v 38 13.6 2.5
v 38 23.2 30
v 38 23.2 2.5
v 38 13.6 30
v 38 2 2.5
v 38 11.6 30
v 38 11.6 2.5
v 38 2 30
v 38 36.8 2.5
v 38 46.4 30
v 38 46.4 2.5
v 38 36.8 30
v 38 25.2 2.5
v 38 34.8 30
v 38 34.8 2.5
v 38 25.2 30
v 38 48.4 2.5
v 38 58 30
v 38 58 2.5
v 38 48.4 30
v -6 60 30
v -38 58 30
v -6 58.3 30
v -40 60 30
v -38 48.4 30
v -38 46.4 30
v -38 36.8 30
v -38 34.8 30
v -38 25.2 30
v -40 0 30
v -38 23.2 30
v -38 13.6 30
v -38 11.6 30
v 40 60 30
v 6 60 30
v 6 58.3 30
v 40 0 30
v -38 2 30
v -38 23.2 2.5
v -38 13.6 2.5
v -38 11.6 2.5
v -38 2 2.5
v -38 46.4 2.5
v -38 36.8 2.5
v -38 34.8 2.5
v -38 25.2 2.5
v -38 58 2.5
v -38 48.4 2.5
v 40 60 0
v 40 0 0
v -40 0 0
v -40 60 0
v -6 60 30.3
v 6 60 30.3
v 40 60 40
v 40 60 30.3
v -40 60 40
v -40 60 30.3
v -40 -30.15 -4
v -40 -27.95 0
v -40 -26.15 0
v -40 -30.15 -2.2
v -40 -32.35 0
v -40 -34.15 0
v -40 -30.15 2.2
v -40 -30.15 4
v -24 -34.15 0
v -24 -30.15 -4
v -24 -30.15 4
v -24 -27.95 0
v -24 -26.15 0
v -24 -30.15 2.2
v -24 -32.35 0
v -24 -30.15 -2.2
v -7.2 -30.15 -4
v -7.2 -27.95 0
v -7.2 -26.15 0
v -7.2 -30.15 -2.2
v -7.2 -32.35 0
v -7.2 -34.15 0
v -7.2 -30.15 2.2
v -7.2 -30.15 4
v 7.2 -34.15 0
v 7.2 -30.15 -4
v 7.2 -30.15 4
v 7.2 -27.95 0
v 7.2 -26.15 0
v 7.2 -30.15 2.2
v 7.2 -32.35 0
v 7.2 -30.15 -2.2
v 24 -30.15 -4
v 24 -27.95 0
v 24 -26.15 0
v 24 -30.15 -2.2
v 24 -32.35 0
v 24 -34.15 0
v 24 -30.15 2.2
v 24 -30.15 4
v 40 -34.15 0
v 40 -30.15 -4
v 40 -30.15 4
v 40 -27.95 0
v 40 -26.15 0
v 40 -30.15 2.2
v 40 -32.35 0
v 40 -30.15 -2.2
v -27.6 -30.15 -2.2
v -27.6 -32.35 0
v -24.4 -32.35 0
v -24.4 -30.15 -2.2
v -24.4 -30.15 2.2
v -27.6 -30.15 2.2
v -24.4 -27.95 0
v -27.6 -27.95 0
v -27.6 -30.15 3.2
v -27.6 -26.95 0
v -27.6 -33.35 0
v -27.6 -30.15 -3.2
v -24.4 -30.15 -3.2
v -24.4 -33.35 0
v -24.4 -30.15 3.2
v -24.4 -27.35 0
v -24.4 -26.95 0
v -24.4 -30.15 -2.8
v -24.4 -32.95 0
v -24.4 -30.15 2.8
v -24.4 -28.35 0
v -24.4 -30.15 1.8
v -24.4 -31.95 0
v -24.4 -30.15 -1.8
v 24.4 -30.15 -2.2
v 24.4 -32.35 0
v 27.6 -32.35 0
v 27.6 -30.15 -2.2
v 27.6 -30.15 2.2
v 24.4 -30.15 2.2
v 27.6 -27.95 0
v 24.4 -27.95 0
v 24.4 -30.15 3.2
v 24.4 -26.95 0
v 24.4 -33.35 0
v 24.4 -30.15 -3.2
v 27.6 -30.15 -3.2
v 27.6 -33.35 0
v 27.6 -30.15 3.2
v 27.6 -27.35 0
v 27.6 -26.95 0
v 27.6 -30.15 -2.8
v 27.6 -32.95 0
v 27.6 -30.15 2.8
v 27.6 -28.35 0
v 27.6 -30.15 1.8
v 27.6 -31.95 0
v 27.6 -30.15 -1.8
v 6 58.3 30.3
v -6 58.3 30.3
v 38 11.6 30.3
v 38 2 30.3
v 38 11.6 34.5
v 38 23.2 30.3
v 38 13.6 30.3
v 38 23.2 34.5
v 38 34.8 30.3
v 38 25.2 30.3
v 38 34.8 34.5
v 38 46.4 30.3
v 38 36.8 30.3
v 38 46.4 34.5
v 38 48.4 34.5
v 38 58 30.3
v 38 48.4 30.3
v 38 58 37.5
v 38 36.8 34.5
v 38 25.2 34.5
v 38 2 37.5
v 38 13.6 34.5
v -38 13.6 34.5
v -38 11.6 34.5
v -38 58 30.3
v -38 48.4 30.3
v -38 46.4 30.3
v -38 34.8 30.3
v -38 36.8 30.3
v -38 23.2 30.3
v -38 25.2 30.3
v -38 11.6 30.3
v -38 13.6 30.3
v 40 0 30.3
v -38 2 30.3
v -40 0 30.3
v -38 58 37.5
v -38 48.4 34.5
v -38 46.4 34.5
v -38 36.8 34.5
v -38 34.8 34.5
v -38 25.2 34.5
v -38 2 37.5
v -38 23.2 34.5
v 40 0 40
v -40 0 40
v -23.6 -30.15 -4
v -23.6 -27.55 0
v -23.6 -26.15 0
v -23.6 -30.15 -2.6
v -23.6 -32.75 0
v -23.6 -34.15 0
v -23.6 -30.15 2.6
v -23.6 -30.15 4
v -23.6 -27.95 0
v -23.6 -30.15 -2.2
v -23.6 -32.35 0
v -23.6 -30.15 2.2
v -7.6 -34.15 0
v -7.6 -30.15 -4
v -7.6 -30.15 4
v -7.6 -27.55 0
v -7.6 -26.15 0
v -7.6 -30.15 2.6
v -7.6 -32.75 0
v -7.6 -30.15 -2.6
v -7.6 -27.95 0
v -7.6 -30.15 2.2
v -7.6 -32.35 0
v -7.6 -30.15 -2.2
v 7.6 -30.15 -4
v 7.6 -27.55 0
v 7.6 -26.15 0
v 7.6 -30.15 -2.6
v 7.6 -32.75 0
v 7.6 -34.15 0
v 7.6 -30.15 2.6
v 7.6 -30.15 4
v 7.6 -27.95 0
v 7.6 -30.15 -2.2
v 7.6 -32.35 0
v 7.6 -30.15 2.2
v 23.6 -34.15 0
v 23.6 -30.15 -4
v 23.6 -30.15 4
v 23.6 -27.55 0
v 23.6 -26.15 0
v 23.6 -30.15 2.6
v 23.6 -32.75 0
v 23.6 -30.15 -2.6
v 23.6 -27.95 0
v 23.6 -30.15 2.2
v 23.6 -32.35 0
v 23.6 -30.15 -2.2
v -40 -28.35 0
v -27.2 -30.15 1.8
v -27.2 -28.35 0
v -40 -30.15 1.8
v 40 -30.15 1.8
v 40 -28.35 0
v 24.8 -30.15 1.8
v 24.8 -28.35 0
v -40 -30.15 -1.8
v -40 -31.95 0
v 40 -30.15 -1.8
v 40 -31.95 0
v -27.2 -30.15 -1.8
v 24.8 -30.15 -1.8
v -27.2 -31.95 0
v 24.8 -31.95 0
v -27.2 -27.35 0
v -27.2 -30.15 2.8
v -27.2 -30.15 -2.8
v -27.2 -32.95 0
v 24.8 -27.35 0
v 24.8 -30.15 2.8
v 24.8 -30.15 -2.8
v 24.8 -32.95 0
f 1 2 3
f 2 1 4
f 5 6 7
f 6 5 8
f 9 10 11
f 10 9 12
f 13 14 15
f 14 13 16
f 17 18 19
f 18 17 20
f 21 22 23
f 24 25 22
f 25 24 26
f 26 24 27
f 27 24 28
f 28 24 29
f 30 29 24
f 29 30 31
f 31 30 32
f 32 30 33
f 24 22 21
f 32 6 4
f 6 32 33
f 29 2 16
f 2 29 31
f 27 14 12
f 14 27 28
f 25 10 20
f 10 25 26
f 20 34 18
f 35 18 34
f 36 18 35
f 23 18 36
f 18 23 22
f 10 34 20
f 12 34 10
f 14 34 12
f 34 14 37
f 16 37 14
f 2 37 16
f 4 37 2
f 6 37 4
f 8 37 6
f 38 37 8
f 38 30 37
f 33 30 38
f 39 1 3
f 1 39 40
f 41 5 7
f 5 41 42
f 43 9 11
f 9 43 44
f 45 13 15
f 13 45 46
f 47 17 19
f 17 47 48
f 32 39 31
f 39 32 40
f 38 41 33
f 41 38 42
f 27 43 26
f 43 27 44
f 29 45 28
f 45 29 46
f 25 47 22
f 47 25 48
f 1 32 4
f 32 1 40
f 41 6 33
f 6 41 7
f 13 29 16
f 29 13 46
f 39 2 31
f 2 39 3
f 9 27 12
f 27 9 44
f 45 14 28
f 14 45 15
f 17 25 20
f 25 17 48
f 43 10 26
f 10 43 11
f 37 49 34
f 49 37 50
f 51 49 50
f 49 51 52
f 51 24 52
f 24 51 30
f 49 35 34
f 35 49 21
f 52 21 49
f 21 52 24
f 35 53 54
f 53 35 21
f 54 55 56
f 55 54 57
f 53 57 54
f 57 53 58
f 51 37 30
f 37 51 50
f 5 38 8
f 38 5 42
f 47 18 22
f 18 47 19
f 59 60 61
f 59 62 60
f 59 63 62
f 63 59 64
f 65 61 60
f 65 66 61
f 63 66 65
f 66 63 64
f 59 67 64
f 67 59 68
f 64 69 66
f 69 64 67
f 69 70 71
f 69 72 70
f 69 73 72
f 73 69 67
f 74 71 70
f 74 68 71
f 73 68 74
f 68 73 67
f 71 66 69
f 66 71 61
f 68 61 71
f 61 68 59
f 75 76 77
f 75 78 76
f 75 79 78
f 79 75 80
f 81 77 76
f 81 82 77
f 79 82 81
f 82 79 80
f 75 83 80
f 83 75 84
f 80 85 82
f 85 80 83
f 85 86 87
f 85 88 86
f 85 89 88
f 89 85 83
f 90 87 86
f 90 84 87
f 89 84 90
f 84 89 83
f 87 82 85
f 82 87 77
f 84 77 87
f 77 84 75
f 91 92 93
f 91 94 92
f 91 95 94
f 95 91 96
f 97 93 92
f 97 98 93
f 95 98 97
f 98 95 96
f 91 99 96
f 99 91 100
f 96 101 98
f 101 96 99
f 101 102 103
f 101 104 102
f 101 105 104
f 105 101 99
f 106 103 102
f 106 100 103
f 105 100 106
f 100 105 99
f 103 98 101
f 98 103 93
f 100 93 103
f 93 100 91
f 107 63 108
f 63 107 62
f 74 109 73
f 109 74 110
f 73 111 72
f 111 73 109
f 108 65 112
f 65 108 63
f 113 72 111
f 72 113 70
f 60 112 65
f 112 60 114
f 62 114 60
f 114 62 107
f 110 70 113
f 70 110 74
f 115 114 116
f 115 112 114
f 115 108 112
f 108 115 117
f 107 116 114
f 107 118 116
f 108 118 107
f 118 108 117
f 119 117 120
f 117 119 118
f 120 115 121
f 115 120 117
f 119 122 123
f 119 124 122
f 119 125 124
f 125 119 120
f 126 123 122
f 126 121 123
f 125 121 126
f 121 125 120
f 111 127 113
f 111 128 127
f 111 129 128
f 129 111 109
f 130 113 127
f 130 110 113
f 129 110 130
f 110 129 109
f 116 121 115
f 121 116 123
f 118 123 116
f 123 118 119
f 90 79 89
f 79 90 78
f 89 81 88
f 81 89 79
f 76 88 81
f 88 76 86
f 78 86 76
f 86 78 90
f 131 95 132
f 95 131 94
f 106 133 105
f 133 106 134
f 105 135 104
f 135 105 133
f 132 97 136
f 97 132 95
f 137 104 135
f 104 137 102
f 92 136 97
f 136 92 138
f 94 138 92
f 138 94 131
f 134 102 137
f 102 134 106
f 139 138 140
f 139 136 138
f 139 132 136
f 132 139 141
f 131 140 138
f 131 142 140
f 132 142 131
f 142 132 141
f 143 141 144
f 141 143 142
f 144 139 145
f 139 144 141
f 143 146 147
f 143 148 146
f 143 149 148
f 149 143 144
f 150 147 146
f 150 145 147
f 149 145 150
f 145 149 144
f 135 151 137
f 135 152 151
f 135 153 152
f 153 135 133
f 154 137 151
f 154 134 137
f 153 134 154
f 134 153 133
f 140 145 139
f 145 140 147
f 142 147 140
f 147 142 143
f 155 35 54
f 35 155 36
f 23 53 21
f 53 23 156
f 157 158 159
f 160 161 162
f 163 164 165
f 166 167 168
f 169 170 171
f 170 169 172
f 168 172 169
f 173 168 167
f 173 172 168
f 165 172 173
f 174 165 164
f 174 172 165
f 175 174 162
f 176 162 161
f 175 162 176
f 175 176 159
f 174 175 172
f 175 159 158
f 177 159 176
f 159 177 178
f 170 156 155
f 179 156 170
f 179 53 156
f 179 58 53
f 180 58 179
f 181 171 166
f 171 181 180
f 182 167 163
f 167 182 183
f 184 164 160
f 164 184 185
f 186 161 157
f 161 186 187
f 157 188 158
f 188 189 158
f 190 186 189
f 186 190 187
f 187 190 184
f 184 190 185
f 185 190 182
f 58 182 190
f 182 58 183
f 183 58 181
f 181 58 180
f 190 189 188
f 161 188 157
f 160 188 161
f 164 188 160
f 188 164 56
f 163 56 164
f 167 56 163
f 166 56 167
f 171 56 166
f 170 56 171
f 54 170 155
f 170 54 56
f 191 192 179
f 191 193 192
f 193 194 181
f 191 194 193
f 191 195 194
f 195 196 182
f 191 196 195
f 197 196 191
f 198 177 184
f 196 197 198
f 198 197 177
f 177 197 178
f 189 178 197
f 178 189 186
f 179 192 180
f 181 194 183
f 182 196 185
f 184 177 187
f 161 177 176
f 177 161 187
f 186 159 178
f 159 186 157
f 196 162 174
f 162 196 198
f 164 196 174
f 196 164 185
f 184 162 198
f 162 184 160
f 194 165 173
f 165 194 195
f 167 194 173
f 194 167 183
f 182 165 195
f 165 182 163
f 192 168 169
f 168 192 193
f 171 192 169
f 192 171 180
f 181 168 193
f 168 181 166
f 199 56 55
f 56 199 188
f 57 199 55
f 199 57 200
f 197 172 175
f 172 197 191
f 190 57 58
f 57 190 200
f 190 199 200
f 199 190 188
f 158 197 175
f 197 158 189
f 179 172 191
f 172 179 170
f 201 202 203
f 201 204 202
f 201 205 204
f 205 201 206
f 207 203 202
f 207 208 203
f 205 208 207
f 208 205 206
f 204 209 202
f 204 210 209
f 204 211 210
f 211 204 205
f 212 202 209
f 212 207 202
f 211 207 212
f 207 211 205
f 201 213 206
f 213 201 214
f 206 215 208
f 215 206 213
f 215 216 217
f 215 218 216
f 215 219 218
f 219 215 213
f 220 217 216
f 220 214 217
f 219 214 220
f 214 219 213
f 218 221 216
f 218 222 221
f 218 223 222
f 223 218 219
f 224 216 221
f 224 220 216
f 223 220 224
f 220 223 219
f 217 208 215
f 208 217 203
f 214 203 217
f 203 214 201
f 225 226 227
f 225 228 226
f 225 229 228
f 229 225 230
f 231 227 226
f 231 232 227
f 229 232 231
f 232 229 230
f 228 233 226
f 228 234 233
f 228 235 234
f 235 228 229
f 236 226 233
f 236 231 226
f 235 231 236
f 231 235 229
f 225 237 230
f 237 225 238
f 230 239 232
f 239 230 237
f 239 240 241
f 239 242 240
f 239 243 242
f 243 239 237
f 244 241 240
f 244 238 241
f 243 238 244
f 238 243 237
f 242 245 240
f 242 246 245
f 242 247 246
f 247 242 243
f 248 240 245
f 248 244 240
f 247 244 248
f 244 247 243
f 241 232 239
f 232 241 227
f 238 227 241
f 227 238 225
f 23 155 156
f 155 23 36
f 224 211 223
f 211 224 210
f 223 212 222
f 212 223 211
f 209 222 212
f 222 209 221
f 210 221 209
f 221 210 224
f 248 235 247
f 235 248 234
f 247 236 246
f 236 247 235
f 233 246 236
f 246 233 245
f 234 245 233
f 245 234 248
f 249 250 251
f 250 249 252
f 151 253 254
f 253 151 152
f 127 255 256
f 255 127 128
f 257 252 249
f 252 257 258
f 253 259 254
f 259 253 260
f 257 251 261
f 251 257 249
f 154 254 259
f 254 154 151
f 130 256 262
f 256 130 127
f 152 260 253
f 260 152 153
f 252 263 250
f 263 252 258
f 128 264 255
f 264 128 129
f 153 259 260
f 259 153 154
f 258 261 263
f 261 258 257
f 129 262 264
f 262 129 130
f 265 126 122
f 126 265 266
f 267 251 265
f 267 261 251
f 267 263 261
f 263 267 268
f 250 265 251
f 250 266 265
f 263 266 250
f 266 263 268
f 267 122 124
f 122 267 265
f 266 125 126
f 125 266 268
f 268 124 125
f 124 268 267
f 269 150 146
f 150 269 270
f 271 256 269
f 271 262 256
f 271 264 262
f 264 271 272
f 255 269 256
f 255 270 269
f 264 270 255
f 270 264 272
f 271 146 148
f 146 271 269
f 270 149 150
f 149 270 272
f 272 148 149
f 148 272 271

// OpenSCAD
/* Box with print-in-place hinge - step 1: params + base */
part = "assembly"; // [base, lid, pin, assembly]

cadverify_only = "";
module instance(name, part, unit = 1) {
    echo(cadverify_instance = [name, part, unit]);
    if (cadverify_only == "" || cadverify_only == name) children();
}

// ---- parameters (mm) ----
W = 80; D = 60; H = 40;          // body outer, closed
baseH = 30;                      // base height
gapZLid = 0.3;                   // lid-base vertical gap
lidBot = baseH + gapZLid;        // 30.3
lidTop = H;                      // 40
axY = 0; axZ = baseH + gapZLid/2; // hinge axis (0, 30.15)
wallT = 2; floorT = 2.5; lidTopT = 2.5;
pinH = 1.8; boreH = 2.2; outH = 4.0; cbH = 3.2; capH = 2.8;
clrR = 0.4; clrA = 0.4;
divT = 2; divTop = 37.2;

// knuckle X intervals
bx10=-40; bx11=-24; lx10=-23.6; lx11=-7.6;
bx20=-7.2; bx21=7.2; lx20=7.6; lx21=23.6; bx30=24; bx31=40;

// generic prism along X from polygon in (Z,Y) mapped: poly points [z,y]
module prism_x(poly, x0, len) {
    translate([x0, 0, 0]) rotate([0,90,0])
        linear_extrude(height=len) polygon(poly);
}
function diamond(h) = [[-h,0],[0,-h],[h,0],[0,h]];

module knuckle_out(x0, len) {
    // diamond cross-section points [z,y] centered at (axZ, axY)
    p = diamond(outH);
    translate([0, axY, axZ]) prism_x(p, x0, len);
}
module bore_small(x0, len) {
    p = diamond(boreH);
    translate([0, axY, axZ]) prism_x(p, x0, len);
}
module bore_cb(x0, len) {
    p = diamond(cbH);
    translate([0, axY, axZ]) prism_x(p, x0, len);
}

function D(h,y0,z0) = [[y0-h,-z0],[y0,-z0-h],[y0+h,-z0],[y0,-z0+h]];
module dia(h,y0,z0,x0,x1) {
    translate([x0,0,0]) rotate([0,90,0])
        linear_extrude(height=x1-x0, convexity=4) polygon(D(h,y0,z0));
}
module base_geo() {
    difference() {
        union() {
            translate([-40,0,0]) cube([80,60,2.5]);            // floor
            translate([-40,0,0]) cube([80,2,30]);              // back wall
            translate([-40,58,0]) cube([80,2,30]);             // front wall
            translate([-40,2,0]) cube([2,56,30]);              // left wall
            translate([38,2,0]) cube([2,56,30]);               // right wall
            for (cy=[12.6,24.2,35.8,47.4])
                translate([-38,cy-1,2.5]) cube([76,2,27.5]);   // dividers
            dia(outH,0,axZ,bx10,bx11);                         // knuckles
            dia(outH,0,axZ,bx20,bx21);
            dia(outH,0,axZ,bx30,bx31);
        }
        // bore channels + cap pockets
        dia(boreH,0,axZ,bx10,bx11); dia(cbH,0,axZ,-27.6,-24.4);
        dia(boreH,0,axZ,bx20,bx21);
        dia(boreH,0,axZ,bx30,bx31); dia(cbH,0,axZ,24.4,27.6);
        // back-wall notches under lid knuckles
        dia(boreH+clrR,0,axZ,lx10,lx11);
        dia(boreH+clrR,0,axZ,lx20,lx21);
        // catch groove in front wall outer face
        translate([-6,58.8,27.5]) cube([12,1.21,1.5]);
    }
}

module lid_geo() {
    difference() {
        union() {
            // top plate: x -40..40, y 0..60, z 37.5..40
            translate([-40,0,37.5]) cube([80,60,2.5]);
            // lid skirt walls 2mm, y 0..60, z 30.3..37.5
            translate([-40,0,30.3]) cube([80,2,7.2]);    // back band
            translate([-40,58,30.3]) cube([80,2,7.2]);   // front band
            translate([-40,2,30.3]) cube([2,56,7.2]);    // left band
            translate([38,2,30.3]) cube([2,56,7.2]);     // right band
            // lid skirt inner closure panels (also skirt divider walls)
            for (cy=[12.6,24.2,35.8,47.4])
                translate([-38,cy-1,30.3]) cube([76,2,4.2]);  // up to 34.5
            // lid knuckles + catch tongue
            dia(outH,0,axZ,lx10,lx11);
            dia(outH,0,axZ,lx20,lx21);
            translate([-6,58.3,27.5]) cube([12,1.7,3.4]);  // tongue tab below front band
        }
        // bore channels
        dia(boreH,0,axZ,lx10,lx11);
        dia(boreH,0,axZ,lx20,lx21);
        // clearance pockets opposite base knuckles
        dia(boreH+clrR,0,axZ,-27.6,-23.6);
        dia(boreH+clrR,0,axZ,-7.6,-7.2);
        dia(boreH+clrR,0,axZ,7.2,7.6);
        dia(boreH+clrR,0,axZ,23.6,27.6);
    }
}
module pin_geo() {
    difference() {
        union() {
            // shaft full hinge length x -40..40
            dia(pinH,0,axZ,-40,40);
            // retaining collars trapped in base counterbores
            dia(capH,0,axZ,-27.2,-24.4);      // left head in pocket -27.6..-24.4
            dia(capH,0,axZ,24.8,27.6);        // right head in pocket 24.4..27.6
        }
        // left head slot (screwdriver grip) open at bottom
        translate([-26.6,-1.1,axZ-14]) cube([2.2,2.2,14]);
    }
}
// --- part orientation helpers + spec + assembly ---

if (part=="base") { base_geo(); }
else if (part=="lid") { lid_geo(); }
else if (part=="pin") { pin_geo(); }
else if (part=="assembly") {
    instance("base","base") base_geo();
    instance("lid","lid") lid_geo();
    instance("pin","pin") pin_geo();
}
